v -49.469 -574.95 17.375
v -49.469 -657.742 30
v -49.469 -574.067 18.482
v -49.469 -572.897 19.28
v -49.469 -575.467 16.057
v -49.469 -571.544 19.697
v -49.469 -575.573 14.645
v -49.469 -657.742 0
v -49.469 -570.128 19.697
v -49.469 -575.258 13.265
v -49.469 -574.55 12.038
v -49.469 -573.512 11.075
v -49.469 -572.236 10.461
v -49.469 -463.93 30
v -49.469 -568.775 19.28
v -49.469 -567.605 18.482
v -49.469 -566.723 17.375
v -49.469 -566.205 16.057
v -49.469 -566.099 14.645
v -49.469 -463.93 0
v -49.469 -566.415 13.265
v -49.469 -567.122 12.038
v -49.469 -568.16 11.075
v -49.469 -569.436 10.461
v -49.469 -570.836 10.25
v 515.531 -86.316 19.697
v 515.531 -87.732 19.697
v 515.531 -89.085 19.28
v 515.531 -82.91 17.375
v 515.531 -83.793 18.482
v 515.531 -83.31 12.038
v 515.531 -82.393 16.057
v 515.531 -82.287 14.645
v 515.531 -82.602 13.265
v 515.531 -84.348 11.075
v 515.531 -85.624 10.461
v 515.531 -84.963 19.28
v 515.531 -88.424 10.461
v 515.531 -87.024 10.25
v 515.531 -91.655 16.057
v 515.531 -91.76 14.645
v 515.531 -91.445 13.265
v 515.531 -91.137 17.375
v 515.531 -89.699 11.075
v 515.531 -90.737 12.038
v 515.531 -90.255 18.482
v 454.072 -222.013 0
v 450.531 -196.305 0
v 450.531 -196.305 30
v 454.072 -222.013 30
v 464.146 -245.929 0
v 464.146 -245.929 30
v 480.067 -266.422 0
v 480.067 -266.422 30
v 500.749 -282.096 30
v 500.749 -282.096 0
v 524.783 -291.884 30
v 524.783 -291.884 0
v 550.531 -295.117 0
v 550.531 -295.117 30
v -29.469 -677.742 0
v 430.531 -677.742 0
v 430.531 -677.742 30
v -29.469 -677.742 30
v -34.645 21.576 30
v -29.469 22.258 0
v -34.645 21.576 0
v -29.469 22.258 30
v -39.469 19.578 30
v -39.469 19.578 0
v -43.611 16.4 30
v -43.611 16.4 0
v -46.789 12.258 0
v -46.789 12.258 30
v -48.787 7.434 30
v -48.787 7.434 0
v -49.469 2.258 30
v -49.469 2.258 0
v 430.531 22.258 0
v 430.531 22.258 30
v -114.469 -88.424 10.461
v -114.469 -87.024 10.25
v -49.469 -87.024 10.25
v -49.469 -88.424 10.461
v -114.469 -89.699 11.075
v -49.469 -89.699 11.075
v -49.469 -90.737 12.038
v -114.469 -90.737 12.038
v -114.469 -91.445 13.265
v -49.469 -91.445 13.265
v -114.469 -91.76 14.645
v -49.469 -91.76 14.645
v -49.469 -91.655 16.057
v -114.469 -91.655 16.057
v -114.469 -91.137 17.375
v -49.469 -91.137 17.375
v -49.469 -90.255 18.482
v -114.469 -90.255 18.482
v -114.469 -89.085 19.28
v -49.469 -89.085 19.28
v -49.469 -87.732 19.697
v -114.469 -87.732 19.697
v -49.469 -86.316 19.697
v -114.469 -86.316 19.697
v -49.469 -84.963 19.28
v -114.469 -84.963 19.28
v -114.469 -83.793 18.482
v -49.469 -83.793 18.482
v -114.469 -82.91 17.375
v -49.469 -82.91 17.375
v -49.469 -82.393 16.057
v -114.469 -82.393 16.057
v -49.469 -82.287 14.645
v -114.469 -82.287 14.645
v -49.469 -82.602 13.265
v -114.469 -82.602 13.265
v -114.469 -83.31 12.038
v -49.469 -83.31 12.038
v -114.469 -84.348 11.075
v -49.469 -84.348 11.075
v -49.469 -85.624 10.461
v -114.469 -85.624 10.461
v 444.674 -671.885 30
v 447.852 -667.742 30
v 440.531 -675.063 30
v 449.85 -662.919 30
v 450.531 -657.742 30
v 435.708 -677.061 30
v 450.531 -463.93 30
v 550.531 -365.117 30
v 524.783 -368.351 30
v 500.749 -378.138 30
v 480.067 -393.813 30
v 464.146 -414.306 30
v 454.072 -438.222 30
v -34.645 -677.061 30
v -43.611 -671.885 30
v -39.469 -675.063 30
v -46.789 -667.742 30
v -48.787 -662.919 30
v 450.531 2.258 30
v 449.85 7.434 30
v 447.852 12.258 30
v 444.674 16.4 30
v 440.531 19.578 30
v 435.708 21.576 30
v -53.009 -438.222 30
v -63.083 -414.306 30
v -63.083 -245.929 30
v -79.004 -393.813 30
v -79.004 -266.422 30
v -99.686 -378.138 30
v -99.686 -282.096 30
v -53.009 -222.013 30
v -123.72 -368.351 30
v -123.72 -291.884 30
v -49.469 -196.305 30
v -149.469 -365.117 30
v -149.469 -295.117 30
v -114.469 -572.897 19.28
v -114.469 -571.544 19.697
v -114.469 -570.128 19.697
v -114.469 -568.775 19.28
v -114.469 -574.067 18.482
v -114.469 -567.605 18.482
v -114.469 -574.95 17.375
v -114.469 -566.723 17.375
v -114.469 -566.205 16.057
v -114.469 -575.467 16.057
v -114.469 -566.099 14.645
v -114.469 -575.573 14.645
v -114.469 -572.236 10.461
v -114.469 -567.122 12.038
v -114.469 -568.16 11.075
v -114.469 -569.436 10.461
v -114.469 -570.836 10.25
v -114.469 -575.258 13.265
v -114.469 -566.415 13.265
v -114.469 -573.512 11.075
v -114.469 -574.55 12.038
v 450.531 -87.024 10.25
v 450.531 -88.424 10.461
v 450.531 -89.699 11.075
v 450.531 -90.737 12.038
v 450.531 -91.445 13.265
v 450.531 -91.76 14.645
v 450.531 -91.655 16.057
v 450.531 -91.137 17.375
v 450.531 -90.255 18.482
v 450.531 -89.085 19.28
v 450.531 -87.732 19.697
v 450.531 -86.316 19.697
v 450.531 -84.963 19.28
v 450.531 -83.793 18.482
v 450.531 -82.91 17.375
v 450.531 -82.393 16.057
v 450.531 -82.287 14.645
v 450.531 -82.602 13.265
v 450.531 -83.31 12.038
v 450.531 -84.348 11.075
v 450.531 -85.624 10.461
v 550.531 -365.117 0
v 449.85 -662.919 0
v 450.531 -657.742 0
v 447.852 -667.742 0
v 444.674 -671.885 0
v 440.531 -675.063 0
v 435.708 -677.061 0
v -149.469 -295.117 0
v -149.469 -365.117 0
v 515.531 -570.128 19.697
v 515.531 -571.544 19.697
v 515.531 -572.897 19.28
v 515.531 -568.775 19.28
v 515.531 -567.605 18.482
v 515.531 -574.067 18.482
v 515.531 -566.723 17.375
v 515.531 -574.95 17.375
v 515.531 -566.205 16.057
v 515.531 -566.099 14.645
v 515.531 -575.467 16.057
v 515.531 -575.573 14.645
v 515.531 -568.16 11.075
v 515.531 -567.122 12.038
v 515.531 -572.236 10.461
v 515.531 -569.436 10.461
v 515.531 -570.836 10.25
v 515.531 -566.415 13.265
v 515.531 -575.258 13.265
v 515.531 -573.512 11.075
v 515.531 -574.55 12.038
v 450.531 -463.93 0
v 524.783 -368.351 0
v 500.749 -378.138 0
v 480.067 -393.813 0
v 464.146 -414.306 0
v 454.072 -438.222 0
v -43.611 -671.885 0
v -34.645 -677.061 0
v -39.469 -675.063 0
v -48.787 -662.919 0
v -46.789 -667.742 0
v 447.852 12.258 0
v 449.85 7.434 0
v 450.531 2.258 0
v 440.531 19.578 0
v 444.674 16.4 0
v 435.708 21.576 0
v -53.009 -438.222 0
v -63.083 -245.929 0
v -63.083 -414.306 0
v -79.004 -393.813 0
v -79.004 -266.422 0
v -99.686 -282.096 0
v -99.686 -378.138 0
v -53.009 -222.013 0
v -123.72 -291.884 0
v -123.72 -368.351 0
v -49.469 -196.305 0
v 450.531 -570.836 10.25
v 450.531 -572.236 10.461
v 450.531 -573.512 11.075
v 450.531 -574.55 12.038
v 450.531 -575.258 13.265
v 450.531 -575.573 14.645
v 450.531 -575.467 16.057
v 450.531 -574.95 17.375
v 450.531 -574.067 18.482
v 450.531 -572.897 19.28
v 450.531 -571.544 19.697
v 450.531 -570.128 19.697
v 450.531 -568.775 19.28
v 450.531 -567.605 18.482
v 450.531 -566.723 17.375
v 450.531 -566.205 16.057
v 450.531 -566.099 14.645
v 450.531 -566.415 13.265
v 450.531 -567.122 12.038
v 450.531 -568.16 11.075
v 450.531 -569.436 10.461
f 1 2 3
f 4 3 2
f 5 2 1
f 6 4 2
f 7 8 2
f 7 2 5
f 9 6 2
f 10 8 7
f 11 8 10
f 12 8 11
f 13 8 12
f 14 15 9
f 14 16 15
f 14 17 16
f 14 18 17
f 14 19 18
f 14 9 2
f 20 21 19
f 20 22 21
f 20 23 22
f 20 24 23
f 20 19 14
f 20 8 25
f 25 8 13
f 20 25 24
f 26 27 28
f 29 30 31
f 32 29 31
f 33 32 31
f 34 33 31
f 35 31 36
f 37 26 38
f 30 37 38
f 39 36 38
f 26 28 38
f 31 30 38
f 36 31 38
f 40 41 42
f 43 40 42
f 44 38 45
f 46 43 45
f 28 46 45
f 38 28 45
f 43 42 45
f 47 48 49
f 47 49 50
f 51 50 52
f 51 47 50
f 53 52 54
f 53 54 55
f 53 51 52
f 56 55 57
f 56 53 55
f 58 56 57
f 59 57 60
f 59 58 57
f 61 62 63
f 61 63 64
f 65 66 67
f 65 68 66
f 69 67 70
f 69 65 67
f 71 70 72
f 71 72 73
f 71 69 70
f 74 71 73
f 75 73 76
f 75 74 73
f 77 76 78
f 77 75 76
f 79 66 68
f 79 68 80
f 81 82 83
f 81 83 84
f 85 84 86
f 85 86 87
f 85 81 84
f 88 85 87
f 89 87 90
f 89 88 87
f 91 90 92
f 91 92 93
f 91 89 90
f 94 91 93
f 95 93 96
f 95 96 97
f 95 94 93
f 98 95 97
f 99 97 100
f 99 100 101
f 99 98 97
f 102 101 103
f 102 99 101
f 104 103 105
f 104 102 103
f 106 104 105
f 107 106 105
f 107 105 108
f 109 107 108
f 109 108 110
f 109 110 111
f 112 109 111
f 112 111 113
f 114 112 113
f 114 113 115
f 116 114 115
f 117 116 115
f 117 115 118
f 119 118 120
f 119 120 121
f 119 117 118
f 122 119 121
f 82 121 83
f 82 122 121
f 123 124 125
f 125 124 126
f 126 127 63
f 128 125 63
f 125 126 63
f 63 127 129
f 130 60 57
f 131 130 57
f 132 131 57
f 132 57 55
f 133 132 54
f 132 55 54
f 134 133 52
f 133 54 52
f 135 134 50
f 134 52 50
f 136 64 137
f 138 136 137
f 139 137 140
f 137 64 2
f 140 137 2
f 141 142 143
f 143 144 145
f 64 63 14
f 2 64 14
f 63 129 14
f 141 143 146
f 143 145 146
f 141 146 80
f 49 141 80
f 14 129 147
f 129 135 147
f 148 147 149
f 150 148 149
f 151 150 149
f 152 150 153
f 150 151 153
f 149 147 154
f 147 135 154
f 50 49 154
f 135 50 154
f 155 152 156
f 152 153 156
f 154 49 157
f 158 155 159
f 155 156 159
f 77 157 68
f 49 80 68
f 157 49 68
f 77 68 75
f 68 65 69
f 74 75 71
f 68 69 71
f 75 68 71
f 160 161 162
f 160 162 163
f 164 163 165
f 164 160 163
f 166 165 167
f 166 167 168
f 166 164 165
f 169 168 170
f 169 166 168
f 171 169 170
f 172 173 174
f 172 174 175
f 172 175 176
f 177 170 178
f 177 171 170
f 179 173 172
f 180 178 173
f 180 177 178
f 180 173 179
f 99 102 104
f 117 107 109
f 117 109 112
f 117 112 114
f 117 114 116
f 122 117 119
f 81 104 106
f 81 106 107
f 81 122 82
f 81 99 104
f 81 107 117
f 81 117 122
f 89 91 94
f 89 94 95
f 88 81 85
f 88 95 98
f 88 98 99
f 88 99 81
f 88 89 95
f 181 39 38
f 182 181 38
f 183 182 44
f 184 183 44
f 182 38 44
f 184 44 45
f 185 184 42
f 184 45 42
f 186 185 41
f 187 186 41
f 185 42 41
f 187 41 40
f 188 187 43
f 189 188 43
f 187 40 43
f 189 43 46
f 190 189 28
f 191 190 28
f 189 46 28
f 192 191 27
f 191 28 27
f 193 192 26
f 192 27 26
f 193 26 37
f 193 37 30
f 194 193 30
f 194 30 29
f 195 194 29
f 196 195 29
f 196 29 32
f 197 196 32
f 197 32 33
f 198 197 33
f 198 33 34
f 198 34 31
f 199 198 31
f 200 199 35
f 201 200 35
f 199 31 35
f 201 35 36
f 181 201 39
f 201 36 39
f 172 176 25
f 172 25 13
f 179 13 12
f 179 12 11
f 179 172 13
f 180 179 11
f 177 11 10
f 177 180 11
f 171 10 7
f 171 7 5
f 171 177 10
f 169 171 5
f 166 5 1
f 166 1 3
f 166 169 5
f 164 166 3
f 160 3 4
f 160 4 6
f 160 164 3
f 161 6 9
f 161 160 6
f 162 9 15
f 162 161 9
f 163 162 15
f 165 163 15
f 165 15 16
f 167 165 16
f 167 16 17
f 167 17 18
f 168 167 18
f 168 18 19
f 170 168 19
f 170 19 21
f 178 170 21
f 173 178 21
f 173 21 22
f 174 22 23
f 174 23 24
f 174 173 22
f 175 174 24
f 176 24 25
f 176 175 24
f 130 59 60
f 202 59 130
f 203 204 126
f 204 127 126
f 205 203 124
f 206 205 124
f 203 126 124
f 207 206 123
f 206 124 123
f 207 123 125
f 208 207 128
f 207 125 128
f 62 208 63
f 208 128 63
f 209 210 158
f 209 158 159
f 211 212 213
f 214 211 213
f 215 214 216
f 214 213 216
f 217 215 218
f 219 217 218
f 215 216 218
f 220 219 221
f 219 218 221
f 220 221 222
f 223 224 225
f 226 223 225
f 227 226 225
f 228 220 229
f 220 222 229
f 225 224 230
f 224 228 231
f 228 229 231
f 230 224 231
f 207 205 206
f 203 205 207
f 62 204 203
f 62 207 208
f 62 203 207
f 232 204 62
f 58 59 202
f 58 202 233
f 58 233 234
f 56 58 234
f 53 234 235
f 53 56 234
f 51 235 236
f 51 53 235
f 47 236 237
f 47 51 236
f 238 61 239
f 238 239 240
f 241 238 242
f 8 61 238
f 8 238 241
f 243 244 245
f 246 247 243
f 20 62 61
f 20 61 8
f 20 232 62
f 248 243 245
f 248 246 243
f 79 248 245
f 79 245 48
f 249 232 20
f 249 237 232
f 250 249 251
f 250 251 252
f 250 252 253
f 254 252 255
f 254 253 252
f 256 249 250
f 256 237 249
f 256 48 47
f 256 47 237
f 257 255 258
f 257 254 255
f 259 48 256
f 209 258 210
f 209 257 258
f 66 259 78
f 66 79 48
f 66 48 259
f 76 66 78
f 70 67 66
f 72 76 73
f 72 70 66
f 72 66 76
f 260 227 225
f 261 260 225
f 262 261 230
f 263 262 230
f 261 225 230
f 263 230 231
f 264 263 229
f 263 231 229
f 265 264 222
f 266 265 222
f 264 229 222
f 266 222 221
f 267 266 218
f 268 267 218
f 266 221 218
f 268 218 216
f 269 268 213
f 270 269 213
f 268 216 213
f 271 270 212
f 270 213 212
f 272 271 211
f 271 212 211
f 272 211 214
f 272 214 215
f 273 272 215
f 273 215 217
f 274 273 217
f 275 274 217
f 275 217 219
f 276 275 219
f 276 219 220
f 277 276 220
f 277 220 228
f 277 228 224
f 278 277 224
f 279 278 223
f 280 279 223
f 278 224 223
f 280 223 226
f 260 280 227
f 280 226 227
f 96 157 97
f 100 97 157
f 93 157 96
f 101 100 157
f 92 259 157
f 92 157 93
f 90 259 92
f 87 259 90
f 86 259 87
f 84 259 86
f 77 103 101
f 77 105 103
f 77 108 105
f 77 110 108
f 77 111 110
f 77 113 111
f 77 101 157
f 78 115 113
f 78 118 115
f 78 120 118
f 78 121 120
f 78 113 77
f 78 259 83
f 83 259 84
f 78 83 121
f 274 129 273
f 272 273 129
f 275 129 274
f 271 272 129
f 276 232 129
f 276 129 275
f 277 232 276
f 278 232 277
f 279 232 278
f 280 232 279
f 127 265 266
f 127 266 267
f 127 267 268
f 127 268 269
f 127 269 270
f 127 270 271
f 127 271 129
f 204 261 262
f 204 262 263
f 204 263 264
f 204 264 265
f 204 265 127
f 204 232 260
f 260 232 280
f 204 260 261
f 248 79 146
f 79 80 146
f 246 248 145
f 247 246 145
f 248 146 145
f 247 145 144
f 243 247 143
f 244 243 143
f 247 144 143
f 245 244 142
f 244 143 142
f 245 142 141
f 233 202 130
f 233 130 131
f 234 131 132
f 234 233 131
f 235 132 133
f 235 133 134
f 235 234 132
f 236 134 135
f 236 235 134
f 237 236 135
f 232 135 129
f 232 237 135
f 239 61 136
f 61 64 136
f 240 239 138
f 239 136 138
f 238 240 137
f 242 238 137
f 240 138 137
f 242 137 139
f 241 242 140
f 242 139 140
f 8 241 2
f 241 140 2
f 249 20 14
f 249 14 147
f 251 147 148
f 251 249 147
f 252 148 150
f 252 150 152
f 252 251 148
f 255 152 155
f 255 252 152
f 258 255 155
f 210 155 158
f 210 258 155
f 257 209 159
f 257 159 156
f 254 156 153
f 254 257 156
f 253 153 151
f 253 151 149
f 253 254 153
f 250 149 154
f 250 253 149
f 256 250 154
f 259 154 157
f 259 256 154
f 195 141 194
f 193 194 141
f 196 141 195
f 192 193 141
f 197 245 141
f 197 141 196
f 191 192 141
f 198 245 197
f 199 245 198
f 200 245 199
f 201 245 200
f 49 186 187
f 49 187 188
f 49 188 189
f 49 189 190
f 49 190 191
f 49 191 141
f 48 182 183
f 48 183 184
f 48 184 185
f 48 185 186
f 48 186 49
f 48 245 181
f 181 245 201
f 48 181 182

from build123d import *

# Parameters (mm, degrees)
ESTRUSIONE_ESTRUSIONE2_DEPTH = 30
SCHIZZO3D1_R                 = 4.75
ESTRUSIONE_ESTRUSIONE7_DEPTH = 65
SCHIZZO3D1_5_R               = 4.75
ESTRUSIONE_ESTRUSIONE8_DEPTH = 65
RACCORDO3_R                  = 20
RACCORDO4_R                  = 20
RACCORDO5_R                  = 20
RACCORDO6_R                  = 20


with BuildPart() as part:
    # Schizzo1 → Estrusione-Estrusione2 (new body)
    with BuildSketch(Plane.XY):
        with BuildLine():
            Line((-49.46854998, 22.257563415), (450.53145002, 22.257563415))
            Line((450.53145002, 22.257563415), (450.53145002, -196.304936585))
            ThreePointArc((450.53145002, -196.304936585), (480.066711204, -266.421864704), (550.53145002, -295.117436585))
            Line((550.53145002, -295.117436585), (550.53145002, -365.117436585))
            ThreePointArc((550.53145002, -365.117436585), (480.066711204, -393.813008466), (450.53145002, -463.929936585))
            Line((450.53145002, -463.929936585), (450.53145002, -677.742436585))
            Line((450.53145002, -677.742436585), (-49.46854998, -677.742436585))
            Line((-49.46854998, -677.742436585), (-49.46854998, -463.929936585))
            ThreePointArc((-49.46854998, -463.929936585), (-79.003811164, -393.813008466), (-149.46854998, -365.117436585))
            Line((-149.46854998, -365.117436585), (-149.46854998, -295.117436585))
            ThreePointArc((-149.46854998, -295.117436585), (-79.003811164, -266.421864704), (-49.46854998, -196.304936585))
            Line((-49.46854998, -196.304936585), (-49.46854998, 22.257563415))
        make_face()
    extrude(amount=ESTRUSIONE_ESTRUSIONE2_DEPTH)

    # Schizzo3D1 → Estrusione-Estrusione7 (add)
    with BuildSketch(Plane(origin=(-114.46854998, -87.023686585, 15), x_dir=(0, -1, 0), z_dir=(-1, 0, 0))):
        with Locations(Location((0, 0, 0), (0, 0, 270))):
            Circle(SCHIZZO3D1_R)
        with Locations(Location((483.8125, 0, 0), (0, 0, 270))):
            Circle(SCHIZZO3D1_R)
    extrude(amount=-ESTRUSIONE_ESTRUSIONE7_DEPTH)

    # Schizzo3D1<5> → Estrusione-Estrusione8 (add)
    with BuildSketch(Plane(origin=(515.53145002, -87.023686585, 15), x_dir=(0, -1, 0), z_dir=(-1, 0, 0))):
        with Locations(Location((0, 0, 0), (0, 0, 270))):
            Circle(SCHIZZO3D1_5_R)
        with Locations(Location((483.8125, 0, 0), (0, 0, 270))):
            Circle(SCHIZZO3D1_5_R)
    extrude(amount=ESTRUSIONE_ESTRUSIONE8_DEPTH)

    # Raccordo3
    raccordo3_edges = [part.edges().sort_by_distance(p)[0] for p in [
        (-49.46854998, 22.257563415, 15),
    ]]
    fillet(raccordo3_edges, radius=RACCORDO3_R)

    # Raccordo4
    raccordo4_edges = [part.edges().sort_by_distance(p)[0] for p in [
        (450.53145002, 22.257563415, 15),
    ]]
    fillet(raccordo4_edges, radius=RACCORDO4_R)

    # Raccordo5
    raccordo5_edges = [part.edges().sort_by_distance(p)[0] for p in [
        (450.53145002, -677.742436585, 15),
    ]]
    fillet(raccordo5_edges, radius=RACCORDO5_R)

    # Raccordo6
    raccordo6_edges = [part.edges().sort_by_distance(p)[0] for p in [
        (-49.46854998, -677.742436585, 15),
    ]]
    fillet(raccordo6_edges, radius=RACCORDO6_R)


solid = part.part
